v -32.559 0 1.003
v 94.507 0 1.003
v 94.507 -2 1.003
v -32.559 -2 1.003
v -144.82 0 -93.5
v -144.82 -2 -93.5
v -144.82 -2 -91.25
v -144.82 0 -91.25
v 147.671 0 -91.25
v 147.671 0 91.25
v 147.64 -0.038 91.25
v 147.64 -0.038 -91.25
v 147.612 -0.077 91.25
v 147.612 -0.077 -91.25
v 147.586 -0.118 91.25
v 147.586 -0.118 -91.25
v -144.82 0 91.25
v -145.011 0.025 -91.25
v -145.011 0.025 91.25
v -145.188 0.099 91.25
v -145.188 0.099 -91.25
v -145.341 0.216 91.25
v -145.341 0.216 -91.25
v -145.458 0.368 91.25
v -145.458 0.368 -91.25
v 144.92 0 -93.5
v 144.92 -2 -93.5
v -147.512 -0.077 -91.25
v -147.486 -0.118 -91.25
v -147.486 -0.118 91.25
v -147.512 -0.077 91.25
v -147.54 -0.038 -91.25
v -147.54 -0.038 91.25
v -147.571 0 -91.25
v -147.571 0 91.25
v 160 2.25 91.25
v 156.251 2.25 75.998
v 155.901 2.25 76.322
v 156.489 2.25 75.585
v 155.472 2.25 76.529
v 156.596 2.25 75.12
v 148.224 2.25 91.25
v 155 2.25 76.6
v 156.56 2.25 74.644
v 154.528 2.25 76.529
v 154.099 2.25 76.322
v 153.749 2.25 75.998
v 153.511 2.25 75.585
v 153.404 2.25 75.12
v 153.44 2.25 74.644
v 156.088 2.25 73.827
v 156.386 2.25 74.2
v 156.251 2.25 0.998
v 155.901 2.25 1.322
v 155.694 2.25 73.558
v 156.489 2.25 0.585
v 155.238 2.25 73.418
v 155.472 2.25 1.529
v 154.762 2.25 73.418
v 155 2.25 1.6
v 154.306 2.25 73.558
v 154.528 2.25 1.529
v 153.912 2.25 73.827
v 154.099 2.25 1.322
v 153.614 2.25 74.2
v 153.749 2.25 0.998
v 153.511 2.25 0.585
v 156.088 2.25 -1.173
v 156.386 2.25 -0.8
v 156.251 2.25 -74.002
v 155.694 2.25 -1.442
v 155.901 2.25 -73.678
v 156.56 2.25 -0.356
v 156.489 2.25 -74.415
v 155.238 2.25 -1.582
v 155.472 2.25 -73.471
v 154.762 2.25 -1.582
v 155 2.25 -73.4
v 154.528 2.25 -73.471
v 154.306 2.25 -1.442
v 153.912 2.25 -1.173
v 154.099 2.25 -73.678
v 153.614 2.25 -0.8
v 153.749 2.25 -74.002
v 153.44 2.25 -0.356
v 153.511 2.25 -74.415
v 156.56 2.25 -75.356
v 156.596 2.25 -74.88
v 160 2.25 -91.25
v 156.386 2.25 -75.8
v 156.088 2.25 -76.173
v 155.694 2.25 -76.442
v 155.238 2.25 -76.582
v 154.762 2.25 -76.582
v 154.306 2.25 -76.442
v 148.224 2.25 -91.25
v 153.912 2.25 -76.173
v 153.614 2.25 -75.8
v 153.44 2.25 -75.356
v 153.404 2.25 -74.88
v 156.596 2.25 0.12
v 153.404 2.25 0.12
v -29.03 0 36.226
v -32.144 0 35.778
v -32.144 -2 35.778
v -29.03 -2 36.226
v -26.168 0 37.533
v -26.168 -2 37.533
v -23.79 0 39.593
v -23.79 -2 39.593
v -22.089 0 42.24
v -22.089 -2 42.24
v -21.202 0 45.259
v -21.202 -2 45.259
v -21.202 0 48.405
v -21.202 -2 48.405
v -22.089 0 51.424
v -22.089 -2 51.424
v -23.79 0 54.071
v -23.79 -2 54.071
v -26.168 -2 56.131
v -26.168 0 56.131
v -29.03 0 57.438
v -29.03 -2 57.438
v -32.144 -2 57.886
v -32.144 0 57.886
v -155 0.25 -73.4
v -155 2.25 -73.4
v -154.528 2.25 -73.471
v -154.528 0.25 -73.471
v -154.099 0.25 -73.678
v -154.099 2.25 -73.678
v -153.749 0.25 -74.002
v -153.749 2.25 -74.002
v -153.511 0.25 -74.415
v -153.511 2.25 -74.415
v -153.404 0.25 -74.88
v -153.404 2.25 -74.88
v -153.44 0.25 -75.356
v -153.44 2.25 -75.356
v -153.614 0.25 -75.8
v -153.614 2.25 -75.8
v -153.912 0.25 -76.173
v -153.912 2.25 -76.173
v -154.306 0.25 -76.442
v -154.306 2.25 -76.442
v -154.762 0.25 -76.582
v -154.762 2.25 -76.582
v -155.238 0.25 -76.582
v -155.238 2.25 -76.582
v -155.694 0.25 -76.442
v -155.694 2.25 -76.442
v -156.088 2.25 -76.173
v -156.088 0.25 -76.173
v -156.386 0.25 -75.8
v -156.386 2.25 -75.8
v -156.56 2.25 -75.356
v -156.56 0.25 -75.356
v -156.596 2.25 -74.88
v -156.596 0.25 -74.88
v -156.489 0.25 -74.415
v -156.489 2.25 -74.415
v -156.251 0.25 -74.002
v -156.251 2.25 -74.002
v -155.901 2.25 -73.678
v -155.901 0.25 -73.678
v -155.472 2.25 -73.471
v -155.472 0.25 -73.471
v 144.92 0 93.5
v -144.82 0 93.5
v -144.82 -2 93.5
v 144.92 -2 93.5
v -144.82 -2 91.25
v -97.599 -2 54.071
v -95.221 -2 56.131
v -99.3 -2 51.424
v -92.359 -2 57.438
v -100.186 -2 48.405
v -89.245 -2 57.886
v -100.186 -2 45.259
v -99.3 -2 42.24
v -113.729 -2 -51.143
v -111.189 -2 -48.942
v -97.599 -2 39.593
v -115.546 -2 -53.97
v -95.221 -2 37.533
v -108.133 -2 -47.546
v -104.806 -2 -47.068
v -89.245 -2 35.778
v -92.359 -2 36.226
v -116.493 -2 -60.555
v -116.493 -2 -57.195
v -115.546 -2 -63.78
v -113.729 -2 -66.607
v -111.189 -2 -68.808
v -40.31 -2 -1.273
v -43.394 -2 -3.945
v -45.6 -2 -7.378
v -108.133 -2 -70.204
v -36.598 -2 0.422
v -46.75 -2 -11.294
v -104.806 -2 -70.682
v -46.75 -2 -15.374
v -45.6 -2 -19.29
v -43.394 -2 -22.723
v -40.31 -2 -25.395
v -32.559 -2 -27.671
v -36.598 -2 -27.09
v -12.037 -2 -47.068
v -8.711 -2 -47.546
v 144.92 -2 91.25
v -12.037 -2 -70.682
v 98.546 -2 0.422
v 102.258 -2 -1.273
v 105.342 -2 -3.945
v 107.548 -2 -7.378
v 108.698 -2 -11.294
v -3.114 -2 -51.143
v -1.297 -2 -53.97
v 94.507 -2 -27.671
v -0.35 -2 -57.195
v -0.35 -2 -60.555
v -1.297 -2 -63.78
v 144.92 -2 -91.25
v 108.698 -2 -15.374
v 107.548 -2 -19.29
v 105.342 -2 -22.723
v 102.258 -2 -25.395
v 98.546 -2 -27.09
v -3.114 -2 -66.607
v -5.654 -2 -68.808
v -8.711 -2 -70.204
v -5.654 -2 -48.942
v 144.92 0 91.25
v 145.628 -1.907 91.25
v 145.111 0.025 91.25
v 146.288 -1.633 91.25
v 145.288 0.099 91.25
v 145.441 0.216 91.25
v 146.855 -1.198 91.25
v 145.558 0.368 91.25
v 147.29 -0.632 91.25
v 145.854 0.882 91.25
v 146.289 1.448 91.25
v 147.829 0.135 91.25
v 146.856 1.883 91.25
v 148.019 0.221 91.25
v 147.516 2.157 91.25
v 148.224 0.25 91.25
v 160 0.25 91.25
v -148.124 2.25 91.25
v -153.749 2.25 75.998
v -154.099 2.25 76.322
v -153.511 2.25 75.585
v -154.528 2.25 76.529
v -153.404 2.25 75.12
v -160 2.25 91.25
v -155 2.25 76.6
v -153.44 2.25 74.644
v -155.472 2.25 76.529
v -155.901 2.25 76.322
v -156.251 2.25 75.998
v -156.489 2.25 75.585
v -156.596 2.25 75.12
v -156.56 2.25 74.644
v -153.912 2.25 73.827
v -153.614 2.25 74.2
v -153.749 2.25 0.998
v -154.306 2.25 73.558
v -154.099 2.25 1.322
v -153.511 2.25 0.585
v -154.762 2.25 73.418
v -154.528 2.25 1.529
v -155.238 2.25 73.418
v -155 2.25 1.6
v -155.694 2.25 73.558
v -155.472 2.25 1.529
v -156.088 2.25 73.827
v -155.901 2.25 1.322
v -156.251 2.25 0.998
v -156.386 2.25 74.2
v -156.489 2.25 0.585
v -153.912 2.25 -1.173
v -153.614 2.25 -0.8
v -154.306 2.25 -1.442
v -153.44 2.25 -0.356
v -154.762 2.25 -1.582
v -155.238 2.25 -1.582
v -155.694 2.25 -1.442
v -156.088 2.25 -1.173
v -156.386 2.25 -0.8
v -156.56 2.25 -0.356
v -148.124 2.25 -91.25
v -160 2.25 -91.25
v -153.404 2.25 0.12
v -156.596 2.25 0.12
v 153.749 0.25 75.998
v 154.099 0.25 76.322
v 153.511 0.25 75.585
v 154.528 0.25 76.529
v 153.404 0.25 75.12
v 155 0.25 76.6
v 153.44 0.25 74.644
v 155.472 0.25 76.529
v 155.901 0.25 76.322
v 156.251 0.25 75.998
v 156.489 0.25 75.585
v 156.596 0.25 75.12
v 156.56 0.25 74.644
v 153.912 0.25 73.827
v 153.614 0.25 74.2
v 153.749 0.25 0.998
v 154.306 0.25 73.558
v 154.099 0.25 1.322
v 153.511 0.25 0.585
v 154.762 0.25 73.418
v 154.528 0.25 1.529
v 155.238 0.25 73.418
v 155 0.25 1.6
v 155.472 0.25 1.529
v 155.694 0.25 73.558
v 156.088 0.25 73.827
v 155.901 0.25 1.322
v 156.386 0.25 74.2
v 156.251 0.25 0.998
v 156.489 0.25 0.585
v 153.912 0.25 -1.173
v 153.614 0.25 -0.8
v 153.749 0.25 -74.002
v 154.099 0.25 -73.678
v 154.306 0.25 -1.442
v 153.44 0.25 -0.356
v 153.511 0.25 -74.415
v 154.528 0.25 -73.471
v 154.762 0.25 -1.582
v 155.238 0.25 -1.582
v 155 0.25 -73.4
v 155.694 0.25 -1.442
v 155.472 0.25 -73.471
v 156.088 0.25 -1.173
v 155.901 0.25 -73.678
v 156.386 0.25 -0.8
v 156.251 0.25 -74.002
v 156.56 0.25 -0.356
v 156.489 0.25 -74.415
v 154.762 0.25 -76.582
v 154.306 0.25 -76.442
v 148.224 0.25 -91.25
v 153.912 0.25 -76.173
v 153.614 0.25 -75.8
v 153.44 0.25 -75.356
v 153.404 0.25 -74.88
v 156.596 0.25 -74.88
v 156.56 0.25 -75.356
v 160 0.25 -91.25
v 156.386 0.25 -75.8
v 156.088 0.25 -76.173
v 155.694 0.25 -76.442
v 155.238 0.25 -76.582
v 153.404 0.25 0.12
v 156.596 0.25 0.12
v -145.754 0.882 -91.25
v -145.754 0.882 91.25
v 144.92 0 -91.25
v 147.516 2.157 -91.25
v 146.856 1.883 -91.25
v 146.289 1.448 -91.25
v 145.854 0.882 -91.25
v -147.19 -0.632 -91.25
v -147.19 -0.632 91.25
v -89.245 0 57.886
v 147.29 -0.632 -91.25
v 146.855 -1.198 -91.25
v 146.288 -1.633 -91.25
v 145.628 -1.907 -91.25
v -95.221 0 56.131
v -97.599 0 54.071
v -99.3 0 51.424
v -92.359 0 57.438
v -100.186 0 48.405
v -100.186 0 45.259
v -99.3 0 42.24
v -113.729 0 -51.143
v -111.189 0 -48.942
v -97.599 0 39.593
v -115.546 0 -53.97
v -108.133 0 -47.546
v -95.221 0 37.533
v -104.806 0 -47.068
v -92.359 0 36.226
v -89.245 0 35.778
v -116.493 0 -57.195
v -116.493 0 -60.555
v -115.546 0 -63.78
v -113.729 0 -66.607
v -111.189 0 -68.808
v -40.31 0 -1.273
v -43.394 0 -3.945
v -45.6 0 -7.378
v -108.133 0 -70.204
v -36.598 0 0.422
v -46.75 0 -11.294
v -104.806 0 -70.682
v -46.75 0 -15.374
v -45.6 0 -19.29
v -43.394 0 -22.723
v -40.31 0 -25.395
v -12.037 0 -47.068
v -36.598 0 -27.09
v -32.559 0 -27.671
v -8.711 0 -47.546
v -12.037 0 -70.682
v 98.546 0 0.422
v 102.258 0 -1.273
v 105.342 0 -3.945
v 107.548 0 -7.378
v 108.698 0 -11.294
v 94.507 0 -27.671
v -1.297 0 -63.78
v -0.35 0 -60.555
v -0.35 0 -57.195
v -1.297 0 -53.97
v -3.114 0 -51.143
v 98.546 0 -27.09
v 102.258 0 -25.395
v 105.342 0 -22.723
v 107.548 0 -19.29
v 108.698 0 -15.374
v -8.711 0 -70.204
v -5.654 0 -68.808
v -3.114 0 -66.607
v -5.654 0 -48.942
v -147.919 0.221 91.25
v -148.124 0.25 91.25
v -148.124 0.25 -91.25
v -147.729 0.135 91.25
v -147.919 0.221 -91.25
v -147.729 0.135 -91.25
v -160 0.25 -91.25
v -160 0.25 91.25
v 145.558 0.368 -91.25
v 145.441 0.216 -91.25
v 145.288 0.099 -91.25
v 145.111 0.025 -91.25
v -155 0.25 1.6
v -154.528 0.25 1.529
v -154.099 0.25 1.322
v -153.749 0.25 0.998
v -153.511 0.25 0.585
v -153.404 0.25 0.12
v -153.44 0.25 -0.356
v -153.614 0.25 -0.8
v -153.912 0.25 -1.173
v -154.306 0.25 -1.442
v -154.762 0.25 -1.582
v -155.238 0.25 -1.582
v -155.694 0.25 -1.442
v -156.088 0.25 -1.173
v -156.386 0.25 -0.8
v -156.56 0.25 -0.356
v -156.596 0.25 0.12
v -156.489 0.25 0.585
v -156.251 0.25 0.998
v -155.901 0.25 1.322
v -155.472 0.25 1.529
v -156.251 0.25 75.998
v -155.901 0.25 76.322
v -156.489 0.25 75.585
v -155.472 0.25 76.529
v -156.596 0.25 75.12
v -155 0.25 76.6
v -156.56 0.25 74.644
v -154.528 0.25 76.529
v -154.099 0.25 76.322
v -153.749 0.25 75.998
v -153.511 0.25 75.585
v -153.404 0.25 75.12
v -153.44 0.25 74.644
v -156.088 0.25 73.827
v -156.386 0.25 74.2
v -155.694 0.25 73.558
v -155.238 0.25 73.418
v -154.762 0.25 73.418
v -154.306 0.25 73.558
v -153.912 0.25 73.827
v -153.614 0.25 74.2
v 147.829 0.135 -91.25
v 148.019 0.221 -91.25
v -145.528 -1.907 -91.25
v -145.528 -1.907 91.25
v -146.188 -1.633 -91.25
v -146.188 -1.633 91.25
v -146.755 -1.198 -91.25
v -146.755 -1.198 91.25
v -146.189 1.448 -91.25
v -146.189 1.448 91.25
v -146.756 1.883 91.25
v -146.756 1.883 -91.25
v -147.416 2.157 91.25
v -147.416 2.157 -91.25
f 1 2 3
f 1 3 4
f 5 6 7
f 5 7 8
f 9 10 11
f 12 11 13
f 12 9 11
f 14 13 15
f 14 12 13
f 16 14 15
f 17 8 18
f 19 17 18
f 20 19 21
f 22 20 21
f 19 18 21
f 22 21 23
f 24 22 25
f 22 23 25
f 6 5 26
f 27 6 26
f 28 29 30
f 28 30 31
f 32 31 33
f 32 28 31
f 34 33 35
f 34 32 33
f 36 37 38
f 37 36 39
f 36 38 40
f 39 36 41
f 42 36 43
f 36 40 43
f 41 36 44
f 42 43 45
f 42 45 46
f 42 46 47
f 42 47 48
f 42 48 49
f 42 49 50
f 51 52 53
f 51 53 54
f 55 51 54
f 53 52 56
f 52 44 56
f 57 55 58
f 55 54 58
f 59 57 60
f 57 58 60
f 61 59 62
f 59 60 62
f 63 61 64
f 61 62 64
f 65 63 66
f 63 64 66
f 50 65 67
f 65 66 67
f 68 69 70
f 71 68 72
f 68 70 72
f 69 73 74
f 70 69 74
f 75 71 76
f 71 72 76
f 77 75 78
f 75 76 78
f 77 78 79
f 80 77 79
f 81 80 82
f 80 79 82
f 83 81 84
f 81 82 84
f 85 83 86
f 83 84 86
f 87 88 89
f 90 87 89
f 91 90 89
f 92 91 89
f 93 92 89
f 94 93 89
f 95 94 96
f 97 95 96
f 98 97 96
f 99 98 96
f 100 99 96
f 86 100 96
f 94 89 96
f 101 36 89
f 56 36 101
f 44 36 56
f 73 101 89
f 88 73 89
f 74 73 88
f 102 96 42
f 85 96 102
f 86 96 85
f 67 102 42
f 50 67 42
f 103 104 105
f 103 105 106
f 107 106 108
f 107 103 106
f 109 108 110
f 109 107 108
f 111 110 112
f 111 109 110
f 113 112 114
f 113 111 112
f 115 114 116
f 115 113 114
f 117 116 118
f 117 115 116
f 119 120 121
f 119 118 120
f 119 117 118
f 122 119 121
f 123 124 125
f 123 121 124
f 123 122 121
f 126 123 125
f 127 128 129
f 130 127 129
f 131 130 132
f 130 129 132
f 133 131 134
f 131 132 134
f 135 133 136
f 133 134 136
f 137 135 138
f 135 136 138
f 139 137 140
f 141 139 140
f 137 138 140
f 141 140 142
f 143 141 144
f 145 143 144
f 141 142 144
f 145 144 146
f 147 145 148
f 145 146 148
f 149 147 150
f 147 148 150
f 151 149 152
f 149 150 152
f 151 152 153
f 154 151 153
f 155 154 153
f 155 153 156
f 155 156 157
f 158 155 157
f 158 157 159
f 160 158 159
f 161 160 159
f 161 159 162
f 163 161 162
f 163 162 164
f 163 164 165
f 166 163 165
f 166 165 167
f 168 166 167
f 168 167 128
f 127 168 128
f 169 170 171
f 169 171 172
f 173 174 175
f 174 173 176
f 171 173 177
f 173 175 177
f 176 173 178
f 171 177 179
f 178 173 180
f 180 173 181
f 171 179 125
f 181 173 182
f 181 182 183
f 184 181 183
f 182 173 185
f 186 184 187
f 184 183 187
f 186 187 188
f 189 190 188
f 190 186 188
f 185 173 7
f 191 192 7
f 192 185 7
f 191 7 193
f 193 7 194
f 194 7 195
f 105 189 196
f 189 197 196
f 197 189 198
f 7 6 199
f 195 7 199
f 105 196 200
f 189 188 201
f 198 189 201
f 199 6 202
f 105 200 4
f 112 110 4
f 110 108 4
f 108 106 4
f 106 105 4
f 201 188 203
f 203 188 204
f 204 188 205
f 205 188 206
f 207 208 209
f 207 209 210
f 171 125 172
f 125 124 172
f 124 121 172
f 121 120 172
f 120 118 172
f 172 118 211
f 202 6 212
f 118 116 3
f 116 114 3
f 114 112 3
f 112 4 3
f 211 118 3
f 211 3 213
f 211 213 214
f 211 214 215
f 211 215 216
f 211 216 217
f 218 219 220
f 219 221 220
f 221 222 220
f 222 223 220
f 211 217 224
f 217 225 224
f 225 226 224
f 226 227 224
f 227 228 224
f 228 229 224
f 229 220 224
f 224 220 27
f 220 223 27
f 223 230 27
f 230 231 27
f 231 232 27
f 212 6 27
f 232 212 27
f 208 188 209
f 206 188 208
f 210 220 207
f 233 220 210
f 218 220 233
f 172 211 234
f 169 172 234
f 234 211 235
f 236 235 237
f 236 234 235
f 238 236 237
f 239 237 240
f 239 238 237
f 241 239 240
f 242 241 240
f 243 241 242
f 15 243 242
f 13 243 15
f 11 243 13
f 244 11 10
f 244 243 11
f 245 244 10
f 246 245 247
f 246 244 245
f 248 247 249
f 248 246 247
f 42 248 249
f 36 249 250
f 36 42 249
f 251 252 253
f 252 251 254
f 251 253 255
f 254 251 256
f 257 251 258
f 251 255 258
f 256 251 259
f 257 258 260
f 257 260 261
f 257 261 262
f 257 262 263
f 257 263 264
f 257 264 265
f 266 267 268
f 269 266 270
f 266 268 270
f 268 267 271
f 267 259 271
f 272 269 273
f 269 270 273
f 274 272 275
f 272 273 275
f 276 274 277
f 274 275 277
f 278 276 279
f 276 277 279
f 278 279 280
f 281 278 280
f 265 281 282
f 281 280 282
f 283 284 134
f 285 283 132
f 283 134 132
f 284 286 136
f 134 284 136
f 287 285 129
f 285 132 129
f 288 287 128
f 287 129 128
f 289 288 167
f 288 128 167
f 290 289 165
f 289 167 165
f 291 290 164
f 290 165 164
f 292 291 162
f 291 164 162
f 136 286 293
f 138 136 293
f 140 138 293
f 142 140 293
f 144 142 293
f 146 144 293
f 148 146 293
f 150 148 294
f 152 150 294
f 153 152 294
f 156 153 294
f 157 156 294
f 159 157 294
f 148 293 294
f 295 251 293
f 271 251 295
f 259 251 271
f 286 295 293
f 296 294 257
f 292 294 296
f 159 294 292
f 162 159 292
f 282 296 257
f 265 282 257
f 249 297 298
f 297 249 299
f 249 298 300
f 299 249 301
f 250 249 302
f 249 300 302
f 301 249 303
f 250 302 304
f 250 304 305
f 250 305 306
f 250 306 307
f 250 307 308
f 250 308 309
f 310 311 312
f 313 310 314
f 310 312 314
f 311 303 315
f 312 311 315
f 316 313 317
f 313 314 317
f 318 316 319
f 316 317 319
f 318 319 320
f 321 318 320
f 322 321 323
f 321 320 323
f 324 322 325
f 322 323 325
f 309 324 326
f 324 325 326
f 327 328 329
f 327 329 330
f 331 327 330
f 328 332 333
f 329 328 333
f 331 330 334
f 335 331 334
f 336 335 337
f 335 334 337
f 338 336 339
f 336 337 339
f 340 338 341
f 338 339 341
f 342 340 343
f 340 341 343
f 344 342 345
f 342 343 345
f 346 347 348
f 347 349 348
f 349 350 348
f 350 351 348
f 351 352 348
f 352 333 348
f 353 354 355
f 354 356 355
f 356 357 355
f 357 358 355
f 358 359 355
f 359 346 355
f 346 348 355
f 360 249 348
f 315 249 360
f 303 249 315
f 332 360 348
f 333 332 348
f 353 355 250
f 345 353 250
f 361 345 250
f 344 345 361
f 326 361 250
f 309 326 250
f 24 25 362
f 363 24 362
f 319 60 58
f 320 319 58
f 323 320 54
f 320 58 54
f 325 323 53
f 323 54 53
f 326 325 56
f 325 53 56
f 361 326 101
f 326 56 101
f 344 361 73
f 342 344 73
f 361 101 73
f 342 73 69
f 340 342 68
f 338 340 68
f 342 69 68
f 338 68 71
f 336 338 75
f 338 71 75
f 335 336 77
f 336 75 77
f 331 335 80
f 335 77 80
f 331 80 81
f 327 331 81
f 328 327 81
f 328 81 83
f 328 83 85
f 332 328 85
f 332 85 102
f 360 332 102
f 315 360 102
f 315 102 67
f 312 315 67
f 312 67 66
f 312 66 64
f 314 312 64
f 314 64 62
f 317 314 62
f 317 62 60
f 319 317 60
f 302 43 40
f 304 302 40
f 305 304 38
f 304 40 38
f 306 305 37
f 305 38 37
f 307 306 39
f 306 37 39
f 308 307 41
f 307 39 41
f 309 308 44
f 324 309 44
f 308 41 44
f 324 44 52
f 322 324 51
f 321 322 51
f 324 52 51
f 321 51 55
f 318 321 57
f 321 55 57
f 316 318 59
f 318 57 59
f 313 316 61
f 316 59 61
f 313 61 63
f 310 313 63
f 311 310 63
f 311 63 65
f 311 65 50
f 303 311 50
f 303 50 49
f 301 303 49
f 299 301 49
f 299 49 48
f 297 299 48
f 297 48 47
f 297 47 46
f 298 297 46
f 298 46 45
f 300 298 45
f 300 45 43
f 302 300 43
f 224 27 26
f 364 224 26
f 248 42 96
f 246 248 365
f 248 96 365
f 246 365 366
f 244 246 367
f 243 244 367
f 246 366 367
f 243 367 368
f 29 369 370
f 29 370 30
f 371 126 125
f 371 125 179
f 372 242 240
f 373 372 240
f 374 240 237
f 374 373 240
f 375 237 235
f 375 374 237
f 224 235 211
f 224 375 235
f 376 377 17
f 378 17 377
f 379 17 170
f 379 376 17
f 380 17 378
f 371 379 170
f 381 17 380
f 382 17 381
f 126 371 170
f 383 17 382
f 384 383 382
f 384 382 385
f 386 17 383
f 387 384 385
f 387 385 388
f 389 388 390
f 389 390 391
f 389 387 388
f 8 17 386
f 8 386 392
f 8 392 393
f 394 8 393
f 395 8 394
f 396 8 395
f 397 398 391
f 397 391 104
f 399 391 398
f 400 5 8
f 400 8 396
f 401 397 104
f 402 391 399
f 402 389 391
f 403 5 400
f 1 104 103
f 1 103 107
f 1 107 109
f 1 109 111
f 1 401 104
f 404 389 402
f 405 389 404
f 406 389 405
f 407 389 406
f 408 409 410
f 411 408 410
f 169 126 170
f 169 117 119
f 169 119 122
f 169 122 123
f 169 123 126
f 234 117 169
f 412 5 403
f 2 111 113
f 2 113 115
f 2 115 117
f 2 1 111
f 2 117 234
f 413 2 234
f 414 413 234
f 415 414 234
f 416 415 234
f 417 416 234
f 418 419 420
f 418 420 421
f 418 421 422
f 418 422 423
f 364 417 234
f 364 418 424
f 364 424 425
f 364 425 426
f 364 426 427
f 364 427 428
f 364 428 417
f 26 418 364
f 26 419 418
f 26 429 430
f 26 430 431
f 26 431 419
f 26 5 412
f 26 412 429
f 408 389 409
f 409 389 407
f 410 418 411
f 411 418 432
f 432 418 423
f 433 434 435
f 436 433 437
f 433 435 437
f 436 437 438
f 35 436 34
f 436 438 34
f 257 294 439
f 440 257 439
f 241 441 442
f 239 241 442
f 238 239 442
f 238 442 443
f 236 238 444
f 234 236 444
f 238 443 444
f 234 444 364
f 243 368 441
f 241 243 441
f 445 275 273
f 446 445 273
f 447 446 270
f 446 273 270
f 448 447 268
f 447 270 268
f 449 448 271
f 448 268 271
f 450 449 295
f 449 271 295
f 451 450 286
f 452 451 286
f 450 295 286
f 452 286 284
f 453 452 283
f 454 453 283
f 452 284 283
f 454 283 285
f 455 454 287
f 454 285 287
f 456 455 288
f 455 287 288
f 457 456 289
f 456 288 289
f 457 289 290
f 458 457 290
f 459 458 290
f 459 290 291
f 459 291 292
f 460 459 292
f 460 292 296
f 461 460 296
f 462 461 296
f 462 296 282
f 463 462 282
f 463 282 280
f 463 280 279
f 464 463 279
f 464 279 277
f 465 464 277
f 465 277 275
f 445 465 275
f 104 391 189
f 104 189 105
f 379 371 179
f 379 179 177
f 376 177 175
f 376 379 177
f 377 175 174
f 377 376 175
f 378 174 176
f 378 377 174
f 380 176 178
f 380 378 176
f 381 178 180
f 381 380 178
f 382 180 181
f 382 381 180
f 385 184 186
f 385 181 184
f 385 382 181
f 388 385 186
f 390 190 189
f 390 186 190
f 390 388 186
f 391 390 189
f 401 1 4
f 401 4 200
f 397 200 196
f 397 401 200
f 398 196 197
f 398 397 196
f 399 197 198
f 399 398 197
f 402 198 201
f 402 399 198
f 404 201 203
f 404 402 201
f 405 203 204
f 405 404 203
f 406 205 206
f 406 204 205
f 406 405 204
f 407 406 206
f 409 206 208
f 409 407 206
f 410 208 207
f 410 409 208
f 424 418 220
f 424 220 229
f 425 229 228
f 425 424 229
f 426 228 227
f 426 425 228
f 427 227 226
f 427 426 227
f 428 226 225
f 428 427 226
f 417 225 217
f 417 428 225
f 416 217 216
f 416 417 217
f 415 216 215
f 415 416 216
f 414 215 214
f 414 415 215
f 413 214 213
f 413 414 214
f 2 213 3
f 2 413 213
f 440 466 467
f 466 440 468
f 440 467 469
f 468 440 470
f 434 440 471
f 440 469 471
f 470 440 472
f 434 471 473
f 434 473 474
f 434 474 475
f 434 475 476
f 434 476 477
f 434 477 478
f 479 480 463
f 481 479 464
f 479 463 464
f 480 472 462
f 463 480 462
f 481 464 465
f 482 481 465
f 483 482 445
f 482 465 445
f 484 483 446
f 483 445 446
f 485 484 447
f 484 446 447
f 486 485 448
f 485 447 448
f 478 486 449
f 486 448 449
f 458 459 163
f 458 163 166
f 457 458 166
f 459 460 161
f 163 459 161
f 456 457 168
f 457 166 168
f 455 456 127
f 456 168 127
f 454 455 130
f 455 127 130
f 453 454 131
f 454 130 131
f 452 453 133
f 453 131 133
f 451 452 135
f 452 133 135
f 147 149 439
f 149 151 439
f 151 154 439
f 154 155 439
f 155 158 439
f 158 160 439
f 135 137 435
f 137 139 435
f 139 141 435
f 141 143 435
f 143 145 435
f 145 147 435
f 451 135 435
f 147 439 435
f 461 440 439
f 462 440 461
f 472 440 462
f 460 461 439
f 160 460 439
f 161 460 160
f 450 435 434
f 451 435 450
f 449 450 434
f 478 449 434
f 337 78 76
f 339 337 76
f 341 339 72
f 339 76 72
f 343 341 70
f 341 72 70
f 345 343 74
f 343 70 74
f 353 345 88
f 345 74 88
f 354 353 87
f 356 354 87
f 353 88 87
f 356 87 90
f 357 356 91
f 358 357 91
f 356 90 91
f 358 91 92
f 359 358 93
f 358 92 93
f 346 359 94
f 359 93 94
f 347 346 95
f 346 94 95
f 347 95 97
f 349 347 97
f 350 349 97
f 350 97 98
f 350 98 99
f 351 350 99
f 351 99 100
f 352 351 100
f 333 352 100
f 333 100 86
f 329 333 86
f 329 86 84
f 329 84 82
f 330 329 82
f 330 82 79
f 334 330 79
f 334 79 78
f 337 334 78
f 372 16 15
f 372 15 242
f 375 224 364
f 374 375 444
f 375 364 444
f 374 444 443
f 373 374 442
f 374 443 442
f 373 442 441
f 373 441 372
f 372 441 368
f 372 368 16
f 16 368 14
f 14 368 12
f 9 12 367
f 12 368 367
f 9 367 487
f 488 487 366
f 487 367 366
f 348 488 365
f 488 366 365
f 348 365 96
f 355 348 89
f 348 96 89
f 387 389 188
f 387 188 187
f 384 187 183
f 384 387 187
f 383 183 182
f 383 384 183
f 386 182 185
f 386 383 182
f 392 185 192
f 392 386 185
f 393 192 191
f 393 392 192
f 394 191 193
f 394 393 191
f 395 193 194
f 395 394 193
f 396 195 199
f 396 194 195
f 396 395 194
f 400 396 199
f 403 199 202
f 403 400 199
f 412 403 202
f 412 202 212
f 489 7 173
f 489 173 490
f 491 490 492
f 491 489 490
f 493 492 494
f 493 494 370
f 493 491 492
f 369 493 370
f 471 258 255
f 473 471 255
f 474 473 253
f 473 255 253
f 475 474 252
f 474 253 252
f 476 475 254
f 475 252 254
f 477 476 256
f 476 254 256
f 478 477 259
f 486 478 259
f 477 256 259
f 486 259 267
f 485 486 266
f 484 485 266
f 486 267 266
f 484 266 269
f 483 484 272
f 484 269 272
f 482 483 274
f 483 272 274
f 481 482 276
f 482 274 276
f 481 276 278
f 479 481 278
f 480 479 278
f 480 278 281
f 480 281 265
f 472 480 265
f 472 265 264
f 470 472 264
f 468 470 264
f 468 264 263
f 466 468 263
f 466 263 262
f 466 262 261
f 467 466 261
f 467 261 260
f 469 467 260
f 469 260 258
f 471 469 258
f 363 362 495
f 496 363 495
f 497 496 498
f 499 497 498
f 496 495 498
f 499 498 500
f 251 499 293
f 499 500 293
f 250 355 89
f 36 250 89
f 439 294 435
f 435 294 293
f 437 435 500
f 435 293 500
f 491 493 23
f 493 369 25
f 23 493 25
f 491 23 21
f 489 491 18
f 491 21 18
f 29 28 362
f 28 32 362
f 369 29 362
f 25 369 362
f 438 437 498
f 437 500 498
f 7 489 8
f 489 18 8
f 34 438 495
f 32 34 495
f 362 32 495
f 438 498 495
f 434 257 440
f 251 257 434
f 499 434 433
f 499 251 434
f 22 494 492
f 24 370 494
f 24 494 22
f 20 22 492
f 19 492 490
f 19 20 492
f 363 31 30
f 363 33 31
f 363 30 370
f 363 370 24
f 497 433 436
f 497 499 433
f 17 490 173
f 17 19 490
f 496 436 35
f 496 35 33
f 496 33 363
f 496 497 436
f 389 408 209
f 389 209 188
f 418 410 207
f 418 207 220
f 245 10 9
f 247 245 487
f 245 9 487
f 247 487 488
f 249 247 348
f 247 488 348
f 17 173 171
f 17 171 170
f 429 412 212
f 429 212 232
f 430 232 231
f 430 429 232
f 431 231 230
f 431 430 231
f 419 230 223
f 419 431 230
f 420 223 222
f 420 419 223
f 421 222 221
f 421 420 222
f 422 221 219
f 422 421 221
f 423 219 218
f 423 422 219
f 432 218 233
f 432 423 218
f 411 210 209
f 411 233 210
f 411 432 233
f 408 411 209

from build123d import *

# Parameters (mm, degrees)
SKETCH_1_W             = 320
SKETCH_1_H             = 182.5
SM_BASE_FLANGE_1_DEPTH = 2
OTHER_START            = -91.25
OTHER_1_DEPTH          = 182.5
OTHER_1_2_DEPTH        = 182.5
OTHER_4_DEPTH          = 182.5
OTHER_4_2_DEPTH        = 182.5
SKETCH_8_R             = 1.6
CUT_EXTRUDE_1_DEPTH    = 10
EXTRUDE_1_DEPTH        = 93.5
EXTRUDE_1_DEPTH_BACK   = 93.5
SKETCH_9_W             = 289.740046506
SKETCH_9_H             = 2
CUT_EXTRUDE_2_DEPTH    = 93.75


# Read off the part's stored shape, not the designer's step: Изгиб1, Изгиб4
# Sheet-metal steps are written as plain solids
with BuildPart() as part:
    # Sketch 1 → Базовая кромка1 (new body)
    with BuildSketch(Plane(origin=(0, 0, 0), x_dir=(1, 0, 0), z_dir=(0, 1, 0))):
        Rectangle(SKETCH_1_W, SKETCH_1_H)
    extrude(amount=-SM_BASE_FLANGE_1_DEPTH)

    # Other 1 outline → Other 1 (cut)
    with BuildSketch(Plane.XY.offset(OTHER_START)):
        with BuildLine():
            ThreePointArc((-144.820023253, -2), (-146.188323253, -1.63336512), (-147.189988373, -0.6317))
            Line((-147.189988373, -0.6317), (-147.486400002, -0.1183))
            ThreePointArc((-147.486400002, -0.1183), (-147.525930573, -0.05704621), (-147.571322452, 0))
            Line((-147.571322452, 0), (-160, 0))
            Line((-160, 0), (-160, -2))
            Line((-160, -2), (-144.820023253, -2))
        make_face()
    extrude(amount=OTHER_1_DEPTH, mode=Mode.SUBTRACT)

    # Other 1 2 outline → Other 1 2 (add)
    with BuildSketch(Plane.XY.offset(OTHER_START)):
        with BuildLine():
            ThreePointArc((-148.124314314, 0.25), (-147.820875688, 0.184596365), (-147.571322452, 0))
            Line((-147.571322452, 0), (-144.820023253, 0))
            ThreePointArc((-144.820023253, 0), (-145.188323253, 0.098685688), (-145.457937566, 0.3683))
            Line((-145.457937566, 0.3683), (-145.754349194, 0.8817))
            ThreePointArc((-145.754349194, 0.8817), (-146.756014314, 1.88336512), (-148.124314314, 2.25))
            Line((-148.124314314, 2.25), (-160, 2.25))
            Line((-160, 2.25), (-160, 0.25))
            Line((-160, 0.25), (-148.124314314, 0.25))
        make_face()
    extrude(amount=OTHER_1_2_DEPTH)

    # Other 4 outline → Other 4 (cut)
    with BuildSketch(Plane.XY.offset(OTHER_START)):
        with BuildLine():
            Line((160, 0), (147.671322452, 0))
            ThreePointArc((147.671322452, 0), (147.625930573, -0.05704621), (147.586400002, -0.1183))
            Line((147.586400002, -0.1183), (147.289988373, -0.6317))
            ThreePointArc((147.289988373, -0.6317), (146.288323253, -1.63336512), (144.920023253, -2))
            Line((144.920023253, -2), (160, -2))
            Line((160, -2), (160, 0))
        make_face()
    extrude(amount=OTHER_4_DEPTH, mode=Mode.SUBTRACT)

    # Other 4 2 outline → Other 4 2 (add)
    with BuildSketch(Plane.XY.offset(OTHER_START)):
        with BuildLine():
            Line((148.224314314, 0.25), (160, 0.25))
            Line((160, 0.25), (160, 2.25))
            Line((160, 2.25), (148.224314314, 2.25))
            ThreePointArc((148.224314314, 2.25), (146.856014314, 1.88336512), (145.854349194, 0.8817))
            Line((145.854349194, 0.8817), (145.557937566, 0.3683))
            ThreePointArc((145.557937566, 0.3683), (145.288323253, 0.098685688), (144.920023253, 0))
            Line((144.920023253, 0), (147.671322452, 0))
            ThreePointArc((147.671322452, 0), (147.920875688, 0.184596365), (148.224314314, 0.25))
        make_face()
    extrude(amount=OTHER_4_2_DEPTH)

    # Эскиз8 → Вырез-Вытянуть1 (cut)
    with BuildSketch(Plane(origin=(0, 2.25, 0), x_dir=(1, 0, 0), z_dir=(0, 1, 0))):
        with Locations(Location((-155, 0, 0), (0, 0, 270))):
            Circle(SKETCH_8_R)
        with Locations(Location((-155, 75, 0), (0, 0, 270))):
            Circle(SKETCH_8_R)
        with Locations(Location((-155, -75, 0), (0, 0, 270))):
            Circle(SKETCH_8_R)
        with Locations(Location((155, -75, 0), (0, 0, 270))):
            Circle(SKETCH_8_R)
        with Locations(Location((155, 75, 0), (0, 0, 270))):
            Circle(SKETCH_8_R)
        with Locations(Location((155, 0, 0), (0, 0, 270))):
            Circle(SKETCH_8_R)
    extrude(amount=-CUT_EXTRUDE_1_DEPTH, mode=Mode.SUBTRACT)

    # Эскиз9 → Бобышка-Вытянуть1 (add, two sides: drawn at the far end of the back side and taken through both)
    with BuildSketch(Plane.XY.offset(-EXTRUDE_1_DEPTH_BACK)):
        with Locations((0.05, -1)):
            Rectangle(SKETCH_9_W, SKETCH_9_H)
    extrude(amount=EXTRUDE_1_DEPTH + EXTRUDE_1_DEPTH_BACK)

    # Эскиз10 → Вырез-Вытянуть2 (cut)
    with BuildSketch(Plane(origin=(0, 0, 0), x_dir=(1, 0, 0), z_dir=(0, 1, 0))):
        with BuildLine():
            Line((-12.037112187, 47.06815468), (-104.806151311, 47.06815468))
            ThreePointArc((-104.806151311, 47.06815468), (-116.613119927, 58.875123295), (-104.806151311, 70.682091911))
            Line((-104.806151311, 70.682091911), (-12.037112187, 70.682091911))
            ThreePointArc((-12.037112187, 70.682091911), (-0.230143571, 58.875123295), (-12.037112187, 47.06815468))
        make_face()
        with BuildLine():
            Line((-32.558748115, 27.670991954), (94.506723655, 27.670991954))
            ThreePointArc((94.506723655, 27.670991954), (108.843756974, 13.333958635), (94.506723655, -1.003074685))
            Line((94.506723655, -1.003074685), (-32.558748115, -1.003074685))
            ThreePointArc((-32.558748115, -1.003074685), (-46.895781434, 13.333958635), (-32.558748115, 27.670991954))
        make_face()
        with BuildLine():
            Line((-89.244817746, -35.777942633), (-32.143884778, -35.777942633))
            ThreePointArc((-32.143884778, -35.777942633), (-21.089903693, -46.831923718), (-32.143884778, -57.885904803))
            Line((-32.143884778, -57.885904803), (-89.244817746, -57.885904803))
            ThreePointArc((-89.244817746, -57.885904803), (-100.298798831, -46.831923718), (-89.244817746, -35.777942633))
        make_face()
    extrude(amount=-CUT_EXTRUDE_2_DEPTH, mode=Mode.SUBTRACT)


solid = part.part
